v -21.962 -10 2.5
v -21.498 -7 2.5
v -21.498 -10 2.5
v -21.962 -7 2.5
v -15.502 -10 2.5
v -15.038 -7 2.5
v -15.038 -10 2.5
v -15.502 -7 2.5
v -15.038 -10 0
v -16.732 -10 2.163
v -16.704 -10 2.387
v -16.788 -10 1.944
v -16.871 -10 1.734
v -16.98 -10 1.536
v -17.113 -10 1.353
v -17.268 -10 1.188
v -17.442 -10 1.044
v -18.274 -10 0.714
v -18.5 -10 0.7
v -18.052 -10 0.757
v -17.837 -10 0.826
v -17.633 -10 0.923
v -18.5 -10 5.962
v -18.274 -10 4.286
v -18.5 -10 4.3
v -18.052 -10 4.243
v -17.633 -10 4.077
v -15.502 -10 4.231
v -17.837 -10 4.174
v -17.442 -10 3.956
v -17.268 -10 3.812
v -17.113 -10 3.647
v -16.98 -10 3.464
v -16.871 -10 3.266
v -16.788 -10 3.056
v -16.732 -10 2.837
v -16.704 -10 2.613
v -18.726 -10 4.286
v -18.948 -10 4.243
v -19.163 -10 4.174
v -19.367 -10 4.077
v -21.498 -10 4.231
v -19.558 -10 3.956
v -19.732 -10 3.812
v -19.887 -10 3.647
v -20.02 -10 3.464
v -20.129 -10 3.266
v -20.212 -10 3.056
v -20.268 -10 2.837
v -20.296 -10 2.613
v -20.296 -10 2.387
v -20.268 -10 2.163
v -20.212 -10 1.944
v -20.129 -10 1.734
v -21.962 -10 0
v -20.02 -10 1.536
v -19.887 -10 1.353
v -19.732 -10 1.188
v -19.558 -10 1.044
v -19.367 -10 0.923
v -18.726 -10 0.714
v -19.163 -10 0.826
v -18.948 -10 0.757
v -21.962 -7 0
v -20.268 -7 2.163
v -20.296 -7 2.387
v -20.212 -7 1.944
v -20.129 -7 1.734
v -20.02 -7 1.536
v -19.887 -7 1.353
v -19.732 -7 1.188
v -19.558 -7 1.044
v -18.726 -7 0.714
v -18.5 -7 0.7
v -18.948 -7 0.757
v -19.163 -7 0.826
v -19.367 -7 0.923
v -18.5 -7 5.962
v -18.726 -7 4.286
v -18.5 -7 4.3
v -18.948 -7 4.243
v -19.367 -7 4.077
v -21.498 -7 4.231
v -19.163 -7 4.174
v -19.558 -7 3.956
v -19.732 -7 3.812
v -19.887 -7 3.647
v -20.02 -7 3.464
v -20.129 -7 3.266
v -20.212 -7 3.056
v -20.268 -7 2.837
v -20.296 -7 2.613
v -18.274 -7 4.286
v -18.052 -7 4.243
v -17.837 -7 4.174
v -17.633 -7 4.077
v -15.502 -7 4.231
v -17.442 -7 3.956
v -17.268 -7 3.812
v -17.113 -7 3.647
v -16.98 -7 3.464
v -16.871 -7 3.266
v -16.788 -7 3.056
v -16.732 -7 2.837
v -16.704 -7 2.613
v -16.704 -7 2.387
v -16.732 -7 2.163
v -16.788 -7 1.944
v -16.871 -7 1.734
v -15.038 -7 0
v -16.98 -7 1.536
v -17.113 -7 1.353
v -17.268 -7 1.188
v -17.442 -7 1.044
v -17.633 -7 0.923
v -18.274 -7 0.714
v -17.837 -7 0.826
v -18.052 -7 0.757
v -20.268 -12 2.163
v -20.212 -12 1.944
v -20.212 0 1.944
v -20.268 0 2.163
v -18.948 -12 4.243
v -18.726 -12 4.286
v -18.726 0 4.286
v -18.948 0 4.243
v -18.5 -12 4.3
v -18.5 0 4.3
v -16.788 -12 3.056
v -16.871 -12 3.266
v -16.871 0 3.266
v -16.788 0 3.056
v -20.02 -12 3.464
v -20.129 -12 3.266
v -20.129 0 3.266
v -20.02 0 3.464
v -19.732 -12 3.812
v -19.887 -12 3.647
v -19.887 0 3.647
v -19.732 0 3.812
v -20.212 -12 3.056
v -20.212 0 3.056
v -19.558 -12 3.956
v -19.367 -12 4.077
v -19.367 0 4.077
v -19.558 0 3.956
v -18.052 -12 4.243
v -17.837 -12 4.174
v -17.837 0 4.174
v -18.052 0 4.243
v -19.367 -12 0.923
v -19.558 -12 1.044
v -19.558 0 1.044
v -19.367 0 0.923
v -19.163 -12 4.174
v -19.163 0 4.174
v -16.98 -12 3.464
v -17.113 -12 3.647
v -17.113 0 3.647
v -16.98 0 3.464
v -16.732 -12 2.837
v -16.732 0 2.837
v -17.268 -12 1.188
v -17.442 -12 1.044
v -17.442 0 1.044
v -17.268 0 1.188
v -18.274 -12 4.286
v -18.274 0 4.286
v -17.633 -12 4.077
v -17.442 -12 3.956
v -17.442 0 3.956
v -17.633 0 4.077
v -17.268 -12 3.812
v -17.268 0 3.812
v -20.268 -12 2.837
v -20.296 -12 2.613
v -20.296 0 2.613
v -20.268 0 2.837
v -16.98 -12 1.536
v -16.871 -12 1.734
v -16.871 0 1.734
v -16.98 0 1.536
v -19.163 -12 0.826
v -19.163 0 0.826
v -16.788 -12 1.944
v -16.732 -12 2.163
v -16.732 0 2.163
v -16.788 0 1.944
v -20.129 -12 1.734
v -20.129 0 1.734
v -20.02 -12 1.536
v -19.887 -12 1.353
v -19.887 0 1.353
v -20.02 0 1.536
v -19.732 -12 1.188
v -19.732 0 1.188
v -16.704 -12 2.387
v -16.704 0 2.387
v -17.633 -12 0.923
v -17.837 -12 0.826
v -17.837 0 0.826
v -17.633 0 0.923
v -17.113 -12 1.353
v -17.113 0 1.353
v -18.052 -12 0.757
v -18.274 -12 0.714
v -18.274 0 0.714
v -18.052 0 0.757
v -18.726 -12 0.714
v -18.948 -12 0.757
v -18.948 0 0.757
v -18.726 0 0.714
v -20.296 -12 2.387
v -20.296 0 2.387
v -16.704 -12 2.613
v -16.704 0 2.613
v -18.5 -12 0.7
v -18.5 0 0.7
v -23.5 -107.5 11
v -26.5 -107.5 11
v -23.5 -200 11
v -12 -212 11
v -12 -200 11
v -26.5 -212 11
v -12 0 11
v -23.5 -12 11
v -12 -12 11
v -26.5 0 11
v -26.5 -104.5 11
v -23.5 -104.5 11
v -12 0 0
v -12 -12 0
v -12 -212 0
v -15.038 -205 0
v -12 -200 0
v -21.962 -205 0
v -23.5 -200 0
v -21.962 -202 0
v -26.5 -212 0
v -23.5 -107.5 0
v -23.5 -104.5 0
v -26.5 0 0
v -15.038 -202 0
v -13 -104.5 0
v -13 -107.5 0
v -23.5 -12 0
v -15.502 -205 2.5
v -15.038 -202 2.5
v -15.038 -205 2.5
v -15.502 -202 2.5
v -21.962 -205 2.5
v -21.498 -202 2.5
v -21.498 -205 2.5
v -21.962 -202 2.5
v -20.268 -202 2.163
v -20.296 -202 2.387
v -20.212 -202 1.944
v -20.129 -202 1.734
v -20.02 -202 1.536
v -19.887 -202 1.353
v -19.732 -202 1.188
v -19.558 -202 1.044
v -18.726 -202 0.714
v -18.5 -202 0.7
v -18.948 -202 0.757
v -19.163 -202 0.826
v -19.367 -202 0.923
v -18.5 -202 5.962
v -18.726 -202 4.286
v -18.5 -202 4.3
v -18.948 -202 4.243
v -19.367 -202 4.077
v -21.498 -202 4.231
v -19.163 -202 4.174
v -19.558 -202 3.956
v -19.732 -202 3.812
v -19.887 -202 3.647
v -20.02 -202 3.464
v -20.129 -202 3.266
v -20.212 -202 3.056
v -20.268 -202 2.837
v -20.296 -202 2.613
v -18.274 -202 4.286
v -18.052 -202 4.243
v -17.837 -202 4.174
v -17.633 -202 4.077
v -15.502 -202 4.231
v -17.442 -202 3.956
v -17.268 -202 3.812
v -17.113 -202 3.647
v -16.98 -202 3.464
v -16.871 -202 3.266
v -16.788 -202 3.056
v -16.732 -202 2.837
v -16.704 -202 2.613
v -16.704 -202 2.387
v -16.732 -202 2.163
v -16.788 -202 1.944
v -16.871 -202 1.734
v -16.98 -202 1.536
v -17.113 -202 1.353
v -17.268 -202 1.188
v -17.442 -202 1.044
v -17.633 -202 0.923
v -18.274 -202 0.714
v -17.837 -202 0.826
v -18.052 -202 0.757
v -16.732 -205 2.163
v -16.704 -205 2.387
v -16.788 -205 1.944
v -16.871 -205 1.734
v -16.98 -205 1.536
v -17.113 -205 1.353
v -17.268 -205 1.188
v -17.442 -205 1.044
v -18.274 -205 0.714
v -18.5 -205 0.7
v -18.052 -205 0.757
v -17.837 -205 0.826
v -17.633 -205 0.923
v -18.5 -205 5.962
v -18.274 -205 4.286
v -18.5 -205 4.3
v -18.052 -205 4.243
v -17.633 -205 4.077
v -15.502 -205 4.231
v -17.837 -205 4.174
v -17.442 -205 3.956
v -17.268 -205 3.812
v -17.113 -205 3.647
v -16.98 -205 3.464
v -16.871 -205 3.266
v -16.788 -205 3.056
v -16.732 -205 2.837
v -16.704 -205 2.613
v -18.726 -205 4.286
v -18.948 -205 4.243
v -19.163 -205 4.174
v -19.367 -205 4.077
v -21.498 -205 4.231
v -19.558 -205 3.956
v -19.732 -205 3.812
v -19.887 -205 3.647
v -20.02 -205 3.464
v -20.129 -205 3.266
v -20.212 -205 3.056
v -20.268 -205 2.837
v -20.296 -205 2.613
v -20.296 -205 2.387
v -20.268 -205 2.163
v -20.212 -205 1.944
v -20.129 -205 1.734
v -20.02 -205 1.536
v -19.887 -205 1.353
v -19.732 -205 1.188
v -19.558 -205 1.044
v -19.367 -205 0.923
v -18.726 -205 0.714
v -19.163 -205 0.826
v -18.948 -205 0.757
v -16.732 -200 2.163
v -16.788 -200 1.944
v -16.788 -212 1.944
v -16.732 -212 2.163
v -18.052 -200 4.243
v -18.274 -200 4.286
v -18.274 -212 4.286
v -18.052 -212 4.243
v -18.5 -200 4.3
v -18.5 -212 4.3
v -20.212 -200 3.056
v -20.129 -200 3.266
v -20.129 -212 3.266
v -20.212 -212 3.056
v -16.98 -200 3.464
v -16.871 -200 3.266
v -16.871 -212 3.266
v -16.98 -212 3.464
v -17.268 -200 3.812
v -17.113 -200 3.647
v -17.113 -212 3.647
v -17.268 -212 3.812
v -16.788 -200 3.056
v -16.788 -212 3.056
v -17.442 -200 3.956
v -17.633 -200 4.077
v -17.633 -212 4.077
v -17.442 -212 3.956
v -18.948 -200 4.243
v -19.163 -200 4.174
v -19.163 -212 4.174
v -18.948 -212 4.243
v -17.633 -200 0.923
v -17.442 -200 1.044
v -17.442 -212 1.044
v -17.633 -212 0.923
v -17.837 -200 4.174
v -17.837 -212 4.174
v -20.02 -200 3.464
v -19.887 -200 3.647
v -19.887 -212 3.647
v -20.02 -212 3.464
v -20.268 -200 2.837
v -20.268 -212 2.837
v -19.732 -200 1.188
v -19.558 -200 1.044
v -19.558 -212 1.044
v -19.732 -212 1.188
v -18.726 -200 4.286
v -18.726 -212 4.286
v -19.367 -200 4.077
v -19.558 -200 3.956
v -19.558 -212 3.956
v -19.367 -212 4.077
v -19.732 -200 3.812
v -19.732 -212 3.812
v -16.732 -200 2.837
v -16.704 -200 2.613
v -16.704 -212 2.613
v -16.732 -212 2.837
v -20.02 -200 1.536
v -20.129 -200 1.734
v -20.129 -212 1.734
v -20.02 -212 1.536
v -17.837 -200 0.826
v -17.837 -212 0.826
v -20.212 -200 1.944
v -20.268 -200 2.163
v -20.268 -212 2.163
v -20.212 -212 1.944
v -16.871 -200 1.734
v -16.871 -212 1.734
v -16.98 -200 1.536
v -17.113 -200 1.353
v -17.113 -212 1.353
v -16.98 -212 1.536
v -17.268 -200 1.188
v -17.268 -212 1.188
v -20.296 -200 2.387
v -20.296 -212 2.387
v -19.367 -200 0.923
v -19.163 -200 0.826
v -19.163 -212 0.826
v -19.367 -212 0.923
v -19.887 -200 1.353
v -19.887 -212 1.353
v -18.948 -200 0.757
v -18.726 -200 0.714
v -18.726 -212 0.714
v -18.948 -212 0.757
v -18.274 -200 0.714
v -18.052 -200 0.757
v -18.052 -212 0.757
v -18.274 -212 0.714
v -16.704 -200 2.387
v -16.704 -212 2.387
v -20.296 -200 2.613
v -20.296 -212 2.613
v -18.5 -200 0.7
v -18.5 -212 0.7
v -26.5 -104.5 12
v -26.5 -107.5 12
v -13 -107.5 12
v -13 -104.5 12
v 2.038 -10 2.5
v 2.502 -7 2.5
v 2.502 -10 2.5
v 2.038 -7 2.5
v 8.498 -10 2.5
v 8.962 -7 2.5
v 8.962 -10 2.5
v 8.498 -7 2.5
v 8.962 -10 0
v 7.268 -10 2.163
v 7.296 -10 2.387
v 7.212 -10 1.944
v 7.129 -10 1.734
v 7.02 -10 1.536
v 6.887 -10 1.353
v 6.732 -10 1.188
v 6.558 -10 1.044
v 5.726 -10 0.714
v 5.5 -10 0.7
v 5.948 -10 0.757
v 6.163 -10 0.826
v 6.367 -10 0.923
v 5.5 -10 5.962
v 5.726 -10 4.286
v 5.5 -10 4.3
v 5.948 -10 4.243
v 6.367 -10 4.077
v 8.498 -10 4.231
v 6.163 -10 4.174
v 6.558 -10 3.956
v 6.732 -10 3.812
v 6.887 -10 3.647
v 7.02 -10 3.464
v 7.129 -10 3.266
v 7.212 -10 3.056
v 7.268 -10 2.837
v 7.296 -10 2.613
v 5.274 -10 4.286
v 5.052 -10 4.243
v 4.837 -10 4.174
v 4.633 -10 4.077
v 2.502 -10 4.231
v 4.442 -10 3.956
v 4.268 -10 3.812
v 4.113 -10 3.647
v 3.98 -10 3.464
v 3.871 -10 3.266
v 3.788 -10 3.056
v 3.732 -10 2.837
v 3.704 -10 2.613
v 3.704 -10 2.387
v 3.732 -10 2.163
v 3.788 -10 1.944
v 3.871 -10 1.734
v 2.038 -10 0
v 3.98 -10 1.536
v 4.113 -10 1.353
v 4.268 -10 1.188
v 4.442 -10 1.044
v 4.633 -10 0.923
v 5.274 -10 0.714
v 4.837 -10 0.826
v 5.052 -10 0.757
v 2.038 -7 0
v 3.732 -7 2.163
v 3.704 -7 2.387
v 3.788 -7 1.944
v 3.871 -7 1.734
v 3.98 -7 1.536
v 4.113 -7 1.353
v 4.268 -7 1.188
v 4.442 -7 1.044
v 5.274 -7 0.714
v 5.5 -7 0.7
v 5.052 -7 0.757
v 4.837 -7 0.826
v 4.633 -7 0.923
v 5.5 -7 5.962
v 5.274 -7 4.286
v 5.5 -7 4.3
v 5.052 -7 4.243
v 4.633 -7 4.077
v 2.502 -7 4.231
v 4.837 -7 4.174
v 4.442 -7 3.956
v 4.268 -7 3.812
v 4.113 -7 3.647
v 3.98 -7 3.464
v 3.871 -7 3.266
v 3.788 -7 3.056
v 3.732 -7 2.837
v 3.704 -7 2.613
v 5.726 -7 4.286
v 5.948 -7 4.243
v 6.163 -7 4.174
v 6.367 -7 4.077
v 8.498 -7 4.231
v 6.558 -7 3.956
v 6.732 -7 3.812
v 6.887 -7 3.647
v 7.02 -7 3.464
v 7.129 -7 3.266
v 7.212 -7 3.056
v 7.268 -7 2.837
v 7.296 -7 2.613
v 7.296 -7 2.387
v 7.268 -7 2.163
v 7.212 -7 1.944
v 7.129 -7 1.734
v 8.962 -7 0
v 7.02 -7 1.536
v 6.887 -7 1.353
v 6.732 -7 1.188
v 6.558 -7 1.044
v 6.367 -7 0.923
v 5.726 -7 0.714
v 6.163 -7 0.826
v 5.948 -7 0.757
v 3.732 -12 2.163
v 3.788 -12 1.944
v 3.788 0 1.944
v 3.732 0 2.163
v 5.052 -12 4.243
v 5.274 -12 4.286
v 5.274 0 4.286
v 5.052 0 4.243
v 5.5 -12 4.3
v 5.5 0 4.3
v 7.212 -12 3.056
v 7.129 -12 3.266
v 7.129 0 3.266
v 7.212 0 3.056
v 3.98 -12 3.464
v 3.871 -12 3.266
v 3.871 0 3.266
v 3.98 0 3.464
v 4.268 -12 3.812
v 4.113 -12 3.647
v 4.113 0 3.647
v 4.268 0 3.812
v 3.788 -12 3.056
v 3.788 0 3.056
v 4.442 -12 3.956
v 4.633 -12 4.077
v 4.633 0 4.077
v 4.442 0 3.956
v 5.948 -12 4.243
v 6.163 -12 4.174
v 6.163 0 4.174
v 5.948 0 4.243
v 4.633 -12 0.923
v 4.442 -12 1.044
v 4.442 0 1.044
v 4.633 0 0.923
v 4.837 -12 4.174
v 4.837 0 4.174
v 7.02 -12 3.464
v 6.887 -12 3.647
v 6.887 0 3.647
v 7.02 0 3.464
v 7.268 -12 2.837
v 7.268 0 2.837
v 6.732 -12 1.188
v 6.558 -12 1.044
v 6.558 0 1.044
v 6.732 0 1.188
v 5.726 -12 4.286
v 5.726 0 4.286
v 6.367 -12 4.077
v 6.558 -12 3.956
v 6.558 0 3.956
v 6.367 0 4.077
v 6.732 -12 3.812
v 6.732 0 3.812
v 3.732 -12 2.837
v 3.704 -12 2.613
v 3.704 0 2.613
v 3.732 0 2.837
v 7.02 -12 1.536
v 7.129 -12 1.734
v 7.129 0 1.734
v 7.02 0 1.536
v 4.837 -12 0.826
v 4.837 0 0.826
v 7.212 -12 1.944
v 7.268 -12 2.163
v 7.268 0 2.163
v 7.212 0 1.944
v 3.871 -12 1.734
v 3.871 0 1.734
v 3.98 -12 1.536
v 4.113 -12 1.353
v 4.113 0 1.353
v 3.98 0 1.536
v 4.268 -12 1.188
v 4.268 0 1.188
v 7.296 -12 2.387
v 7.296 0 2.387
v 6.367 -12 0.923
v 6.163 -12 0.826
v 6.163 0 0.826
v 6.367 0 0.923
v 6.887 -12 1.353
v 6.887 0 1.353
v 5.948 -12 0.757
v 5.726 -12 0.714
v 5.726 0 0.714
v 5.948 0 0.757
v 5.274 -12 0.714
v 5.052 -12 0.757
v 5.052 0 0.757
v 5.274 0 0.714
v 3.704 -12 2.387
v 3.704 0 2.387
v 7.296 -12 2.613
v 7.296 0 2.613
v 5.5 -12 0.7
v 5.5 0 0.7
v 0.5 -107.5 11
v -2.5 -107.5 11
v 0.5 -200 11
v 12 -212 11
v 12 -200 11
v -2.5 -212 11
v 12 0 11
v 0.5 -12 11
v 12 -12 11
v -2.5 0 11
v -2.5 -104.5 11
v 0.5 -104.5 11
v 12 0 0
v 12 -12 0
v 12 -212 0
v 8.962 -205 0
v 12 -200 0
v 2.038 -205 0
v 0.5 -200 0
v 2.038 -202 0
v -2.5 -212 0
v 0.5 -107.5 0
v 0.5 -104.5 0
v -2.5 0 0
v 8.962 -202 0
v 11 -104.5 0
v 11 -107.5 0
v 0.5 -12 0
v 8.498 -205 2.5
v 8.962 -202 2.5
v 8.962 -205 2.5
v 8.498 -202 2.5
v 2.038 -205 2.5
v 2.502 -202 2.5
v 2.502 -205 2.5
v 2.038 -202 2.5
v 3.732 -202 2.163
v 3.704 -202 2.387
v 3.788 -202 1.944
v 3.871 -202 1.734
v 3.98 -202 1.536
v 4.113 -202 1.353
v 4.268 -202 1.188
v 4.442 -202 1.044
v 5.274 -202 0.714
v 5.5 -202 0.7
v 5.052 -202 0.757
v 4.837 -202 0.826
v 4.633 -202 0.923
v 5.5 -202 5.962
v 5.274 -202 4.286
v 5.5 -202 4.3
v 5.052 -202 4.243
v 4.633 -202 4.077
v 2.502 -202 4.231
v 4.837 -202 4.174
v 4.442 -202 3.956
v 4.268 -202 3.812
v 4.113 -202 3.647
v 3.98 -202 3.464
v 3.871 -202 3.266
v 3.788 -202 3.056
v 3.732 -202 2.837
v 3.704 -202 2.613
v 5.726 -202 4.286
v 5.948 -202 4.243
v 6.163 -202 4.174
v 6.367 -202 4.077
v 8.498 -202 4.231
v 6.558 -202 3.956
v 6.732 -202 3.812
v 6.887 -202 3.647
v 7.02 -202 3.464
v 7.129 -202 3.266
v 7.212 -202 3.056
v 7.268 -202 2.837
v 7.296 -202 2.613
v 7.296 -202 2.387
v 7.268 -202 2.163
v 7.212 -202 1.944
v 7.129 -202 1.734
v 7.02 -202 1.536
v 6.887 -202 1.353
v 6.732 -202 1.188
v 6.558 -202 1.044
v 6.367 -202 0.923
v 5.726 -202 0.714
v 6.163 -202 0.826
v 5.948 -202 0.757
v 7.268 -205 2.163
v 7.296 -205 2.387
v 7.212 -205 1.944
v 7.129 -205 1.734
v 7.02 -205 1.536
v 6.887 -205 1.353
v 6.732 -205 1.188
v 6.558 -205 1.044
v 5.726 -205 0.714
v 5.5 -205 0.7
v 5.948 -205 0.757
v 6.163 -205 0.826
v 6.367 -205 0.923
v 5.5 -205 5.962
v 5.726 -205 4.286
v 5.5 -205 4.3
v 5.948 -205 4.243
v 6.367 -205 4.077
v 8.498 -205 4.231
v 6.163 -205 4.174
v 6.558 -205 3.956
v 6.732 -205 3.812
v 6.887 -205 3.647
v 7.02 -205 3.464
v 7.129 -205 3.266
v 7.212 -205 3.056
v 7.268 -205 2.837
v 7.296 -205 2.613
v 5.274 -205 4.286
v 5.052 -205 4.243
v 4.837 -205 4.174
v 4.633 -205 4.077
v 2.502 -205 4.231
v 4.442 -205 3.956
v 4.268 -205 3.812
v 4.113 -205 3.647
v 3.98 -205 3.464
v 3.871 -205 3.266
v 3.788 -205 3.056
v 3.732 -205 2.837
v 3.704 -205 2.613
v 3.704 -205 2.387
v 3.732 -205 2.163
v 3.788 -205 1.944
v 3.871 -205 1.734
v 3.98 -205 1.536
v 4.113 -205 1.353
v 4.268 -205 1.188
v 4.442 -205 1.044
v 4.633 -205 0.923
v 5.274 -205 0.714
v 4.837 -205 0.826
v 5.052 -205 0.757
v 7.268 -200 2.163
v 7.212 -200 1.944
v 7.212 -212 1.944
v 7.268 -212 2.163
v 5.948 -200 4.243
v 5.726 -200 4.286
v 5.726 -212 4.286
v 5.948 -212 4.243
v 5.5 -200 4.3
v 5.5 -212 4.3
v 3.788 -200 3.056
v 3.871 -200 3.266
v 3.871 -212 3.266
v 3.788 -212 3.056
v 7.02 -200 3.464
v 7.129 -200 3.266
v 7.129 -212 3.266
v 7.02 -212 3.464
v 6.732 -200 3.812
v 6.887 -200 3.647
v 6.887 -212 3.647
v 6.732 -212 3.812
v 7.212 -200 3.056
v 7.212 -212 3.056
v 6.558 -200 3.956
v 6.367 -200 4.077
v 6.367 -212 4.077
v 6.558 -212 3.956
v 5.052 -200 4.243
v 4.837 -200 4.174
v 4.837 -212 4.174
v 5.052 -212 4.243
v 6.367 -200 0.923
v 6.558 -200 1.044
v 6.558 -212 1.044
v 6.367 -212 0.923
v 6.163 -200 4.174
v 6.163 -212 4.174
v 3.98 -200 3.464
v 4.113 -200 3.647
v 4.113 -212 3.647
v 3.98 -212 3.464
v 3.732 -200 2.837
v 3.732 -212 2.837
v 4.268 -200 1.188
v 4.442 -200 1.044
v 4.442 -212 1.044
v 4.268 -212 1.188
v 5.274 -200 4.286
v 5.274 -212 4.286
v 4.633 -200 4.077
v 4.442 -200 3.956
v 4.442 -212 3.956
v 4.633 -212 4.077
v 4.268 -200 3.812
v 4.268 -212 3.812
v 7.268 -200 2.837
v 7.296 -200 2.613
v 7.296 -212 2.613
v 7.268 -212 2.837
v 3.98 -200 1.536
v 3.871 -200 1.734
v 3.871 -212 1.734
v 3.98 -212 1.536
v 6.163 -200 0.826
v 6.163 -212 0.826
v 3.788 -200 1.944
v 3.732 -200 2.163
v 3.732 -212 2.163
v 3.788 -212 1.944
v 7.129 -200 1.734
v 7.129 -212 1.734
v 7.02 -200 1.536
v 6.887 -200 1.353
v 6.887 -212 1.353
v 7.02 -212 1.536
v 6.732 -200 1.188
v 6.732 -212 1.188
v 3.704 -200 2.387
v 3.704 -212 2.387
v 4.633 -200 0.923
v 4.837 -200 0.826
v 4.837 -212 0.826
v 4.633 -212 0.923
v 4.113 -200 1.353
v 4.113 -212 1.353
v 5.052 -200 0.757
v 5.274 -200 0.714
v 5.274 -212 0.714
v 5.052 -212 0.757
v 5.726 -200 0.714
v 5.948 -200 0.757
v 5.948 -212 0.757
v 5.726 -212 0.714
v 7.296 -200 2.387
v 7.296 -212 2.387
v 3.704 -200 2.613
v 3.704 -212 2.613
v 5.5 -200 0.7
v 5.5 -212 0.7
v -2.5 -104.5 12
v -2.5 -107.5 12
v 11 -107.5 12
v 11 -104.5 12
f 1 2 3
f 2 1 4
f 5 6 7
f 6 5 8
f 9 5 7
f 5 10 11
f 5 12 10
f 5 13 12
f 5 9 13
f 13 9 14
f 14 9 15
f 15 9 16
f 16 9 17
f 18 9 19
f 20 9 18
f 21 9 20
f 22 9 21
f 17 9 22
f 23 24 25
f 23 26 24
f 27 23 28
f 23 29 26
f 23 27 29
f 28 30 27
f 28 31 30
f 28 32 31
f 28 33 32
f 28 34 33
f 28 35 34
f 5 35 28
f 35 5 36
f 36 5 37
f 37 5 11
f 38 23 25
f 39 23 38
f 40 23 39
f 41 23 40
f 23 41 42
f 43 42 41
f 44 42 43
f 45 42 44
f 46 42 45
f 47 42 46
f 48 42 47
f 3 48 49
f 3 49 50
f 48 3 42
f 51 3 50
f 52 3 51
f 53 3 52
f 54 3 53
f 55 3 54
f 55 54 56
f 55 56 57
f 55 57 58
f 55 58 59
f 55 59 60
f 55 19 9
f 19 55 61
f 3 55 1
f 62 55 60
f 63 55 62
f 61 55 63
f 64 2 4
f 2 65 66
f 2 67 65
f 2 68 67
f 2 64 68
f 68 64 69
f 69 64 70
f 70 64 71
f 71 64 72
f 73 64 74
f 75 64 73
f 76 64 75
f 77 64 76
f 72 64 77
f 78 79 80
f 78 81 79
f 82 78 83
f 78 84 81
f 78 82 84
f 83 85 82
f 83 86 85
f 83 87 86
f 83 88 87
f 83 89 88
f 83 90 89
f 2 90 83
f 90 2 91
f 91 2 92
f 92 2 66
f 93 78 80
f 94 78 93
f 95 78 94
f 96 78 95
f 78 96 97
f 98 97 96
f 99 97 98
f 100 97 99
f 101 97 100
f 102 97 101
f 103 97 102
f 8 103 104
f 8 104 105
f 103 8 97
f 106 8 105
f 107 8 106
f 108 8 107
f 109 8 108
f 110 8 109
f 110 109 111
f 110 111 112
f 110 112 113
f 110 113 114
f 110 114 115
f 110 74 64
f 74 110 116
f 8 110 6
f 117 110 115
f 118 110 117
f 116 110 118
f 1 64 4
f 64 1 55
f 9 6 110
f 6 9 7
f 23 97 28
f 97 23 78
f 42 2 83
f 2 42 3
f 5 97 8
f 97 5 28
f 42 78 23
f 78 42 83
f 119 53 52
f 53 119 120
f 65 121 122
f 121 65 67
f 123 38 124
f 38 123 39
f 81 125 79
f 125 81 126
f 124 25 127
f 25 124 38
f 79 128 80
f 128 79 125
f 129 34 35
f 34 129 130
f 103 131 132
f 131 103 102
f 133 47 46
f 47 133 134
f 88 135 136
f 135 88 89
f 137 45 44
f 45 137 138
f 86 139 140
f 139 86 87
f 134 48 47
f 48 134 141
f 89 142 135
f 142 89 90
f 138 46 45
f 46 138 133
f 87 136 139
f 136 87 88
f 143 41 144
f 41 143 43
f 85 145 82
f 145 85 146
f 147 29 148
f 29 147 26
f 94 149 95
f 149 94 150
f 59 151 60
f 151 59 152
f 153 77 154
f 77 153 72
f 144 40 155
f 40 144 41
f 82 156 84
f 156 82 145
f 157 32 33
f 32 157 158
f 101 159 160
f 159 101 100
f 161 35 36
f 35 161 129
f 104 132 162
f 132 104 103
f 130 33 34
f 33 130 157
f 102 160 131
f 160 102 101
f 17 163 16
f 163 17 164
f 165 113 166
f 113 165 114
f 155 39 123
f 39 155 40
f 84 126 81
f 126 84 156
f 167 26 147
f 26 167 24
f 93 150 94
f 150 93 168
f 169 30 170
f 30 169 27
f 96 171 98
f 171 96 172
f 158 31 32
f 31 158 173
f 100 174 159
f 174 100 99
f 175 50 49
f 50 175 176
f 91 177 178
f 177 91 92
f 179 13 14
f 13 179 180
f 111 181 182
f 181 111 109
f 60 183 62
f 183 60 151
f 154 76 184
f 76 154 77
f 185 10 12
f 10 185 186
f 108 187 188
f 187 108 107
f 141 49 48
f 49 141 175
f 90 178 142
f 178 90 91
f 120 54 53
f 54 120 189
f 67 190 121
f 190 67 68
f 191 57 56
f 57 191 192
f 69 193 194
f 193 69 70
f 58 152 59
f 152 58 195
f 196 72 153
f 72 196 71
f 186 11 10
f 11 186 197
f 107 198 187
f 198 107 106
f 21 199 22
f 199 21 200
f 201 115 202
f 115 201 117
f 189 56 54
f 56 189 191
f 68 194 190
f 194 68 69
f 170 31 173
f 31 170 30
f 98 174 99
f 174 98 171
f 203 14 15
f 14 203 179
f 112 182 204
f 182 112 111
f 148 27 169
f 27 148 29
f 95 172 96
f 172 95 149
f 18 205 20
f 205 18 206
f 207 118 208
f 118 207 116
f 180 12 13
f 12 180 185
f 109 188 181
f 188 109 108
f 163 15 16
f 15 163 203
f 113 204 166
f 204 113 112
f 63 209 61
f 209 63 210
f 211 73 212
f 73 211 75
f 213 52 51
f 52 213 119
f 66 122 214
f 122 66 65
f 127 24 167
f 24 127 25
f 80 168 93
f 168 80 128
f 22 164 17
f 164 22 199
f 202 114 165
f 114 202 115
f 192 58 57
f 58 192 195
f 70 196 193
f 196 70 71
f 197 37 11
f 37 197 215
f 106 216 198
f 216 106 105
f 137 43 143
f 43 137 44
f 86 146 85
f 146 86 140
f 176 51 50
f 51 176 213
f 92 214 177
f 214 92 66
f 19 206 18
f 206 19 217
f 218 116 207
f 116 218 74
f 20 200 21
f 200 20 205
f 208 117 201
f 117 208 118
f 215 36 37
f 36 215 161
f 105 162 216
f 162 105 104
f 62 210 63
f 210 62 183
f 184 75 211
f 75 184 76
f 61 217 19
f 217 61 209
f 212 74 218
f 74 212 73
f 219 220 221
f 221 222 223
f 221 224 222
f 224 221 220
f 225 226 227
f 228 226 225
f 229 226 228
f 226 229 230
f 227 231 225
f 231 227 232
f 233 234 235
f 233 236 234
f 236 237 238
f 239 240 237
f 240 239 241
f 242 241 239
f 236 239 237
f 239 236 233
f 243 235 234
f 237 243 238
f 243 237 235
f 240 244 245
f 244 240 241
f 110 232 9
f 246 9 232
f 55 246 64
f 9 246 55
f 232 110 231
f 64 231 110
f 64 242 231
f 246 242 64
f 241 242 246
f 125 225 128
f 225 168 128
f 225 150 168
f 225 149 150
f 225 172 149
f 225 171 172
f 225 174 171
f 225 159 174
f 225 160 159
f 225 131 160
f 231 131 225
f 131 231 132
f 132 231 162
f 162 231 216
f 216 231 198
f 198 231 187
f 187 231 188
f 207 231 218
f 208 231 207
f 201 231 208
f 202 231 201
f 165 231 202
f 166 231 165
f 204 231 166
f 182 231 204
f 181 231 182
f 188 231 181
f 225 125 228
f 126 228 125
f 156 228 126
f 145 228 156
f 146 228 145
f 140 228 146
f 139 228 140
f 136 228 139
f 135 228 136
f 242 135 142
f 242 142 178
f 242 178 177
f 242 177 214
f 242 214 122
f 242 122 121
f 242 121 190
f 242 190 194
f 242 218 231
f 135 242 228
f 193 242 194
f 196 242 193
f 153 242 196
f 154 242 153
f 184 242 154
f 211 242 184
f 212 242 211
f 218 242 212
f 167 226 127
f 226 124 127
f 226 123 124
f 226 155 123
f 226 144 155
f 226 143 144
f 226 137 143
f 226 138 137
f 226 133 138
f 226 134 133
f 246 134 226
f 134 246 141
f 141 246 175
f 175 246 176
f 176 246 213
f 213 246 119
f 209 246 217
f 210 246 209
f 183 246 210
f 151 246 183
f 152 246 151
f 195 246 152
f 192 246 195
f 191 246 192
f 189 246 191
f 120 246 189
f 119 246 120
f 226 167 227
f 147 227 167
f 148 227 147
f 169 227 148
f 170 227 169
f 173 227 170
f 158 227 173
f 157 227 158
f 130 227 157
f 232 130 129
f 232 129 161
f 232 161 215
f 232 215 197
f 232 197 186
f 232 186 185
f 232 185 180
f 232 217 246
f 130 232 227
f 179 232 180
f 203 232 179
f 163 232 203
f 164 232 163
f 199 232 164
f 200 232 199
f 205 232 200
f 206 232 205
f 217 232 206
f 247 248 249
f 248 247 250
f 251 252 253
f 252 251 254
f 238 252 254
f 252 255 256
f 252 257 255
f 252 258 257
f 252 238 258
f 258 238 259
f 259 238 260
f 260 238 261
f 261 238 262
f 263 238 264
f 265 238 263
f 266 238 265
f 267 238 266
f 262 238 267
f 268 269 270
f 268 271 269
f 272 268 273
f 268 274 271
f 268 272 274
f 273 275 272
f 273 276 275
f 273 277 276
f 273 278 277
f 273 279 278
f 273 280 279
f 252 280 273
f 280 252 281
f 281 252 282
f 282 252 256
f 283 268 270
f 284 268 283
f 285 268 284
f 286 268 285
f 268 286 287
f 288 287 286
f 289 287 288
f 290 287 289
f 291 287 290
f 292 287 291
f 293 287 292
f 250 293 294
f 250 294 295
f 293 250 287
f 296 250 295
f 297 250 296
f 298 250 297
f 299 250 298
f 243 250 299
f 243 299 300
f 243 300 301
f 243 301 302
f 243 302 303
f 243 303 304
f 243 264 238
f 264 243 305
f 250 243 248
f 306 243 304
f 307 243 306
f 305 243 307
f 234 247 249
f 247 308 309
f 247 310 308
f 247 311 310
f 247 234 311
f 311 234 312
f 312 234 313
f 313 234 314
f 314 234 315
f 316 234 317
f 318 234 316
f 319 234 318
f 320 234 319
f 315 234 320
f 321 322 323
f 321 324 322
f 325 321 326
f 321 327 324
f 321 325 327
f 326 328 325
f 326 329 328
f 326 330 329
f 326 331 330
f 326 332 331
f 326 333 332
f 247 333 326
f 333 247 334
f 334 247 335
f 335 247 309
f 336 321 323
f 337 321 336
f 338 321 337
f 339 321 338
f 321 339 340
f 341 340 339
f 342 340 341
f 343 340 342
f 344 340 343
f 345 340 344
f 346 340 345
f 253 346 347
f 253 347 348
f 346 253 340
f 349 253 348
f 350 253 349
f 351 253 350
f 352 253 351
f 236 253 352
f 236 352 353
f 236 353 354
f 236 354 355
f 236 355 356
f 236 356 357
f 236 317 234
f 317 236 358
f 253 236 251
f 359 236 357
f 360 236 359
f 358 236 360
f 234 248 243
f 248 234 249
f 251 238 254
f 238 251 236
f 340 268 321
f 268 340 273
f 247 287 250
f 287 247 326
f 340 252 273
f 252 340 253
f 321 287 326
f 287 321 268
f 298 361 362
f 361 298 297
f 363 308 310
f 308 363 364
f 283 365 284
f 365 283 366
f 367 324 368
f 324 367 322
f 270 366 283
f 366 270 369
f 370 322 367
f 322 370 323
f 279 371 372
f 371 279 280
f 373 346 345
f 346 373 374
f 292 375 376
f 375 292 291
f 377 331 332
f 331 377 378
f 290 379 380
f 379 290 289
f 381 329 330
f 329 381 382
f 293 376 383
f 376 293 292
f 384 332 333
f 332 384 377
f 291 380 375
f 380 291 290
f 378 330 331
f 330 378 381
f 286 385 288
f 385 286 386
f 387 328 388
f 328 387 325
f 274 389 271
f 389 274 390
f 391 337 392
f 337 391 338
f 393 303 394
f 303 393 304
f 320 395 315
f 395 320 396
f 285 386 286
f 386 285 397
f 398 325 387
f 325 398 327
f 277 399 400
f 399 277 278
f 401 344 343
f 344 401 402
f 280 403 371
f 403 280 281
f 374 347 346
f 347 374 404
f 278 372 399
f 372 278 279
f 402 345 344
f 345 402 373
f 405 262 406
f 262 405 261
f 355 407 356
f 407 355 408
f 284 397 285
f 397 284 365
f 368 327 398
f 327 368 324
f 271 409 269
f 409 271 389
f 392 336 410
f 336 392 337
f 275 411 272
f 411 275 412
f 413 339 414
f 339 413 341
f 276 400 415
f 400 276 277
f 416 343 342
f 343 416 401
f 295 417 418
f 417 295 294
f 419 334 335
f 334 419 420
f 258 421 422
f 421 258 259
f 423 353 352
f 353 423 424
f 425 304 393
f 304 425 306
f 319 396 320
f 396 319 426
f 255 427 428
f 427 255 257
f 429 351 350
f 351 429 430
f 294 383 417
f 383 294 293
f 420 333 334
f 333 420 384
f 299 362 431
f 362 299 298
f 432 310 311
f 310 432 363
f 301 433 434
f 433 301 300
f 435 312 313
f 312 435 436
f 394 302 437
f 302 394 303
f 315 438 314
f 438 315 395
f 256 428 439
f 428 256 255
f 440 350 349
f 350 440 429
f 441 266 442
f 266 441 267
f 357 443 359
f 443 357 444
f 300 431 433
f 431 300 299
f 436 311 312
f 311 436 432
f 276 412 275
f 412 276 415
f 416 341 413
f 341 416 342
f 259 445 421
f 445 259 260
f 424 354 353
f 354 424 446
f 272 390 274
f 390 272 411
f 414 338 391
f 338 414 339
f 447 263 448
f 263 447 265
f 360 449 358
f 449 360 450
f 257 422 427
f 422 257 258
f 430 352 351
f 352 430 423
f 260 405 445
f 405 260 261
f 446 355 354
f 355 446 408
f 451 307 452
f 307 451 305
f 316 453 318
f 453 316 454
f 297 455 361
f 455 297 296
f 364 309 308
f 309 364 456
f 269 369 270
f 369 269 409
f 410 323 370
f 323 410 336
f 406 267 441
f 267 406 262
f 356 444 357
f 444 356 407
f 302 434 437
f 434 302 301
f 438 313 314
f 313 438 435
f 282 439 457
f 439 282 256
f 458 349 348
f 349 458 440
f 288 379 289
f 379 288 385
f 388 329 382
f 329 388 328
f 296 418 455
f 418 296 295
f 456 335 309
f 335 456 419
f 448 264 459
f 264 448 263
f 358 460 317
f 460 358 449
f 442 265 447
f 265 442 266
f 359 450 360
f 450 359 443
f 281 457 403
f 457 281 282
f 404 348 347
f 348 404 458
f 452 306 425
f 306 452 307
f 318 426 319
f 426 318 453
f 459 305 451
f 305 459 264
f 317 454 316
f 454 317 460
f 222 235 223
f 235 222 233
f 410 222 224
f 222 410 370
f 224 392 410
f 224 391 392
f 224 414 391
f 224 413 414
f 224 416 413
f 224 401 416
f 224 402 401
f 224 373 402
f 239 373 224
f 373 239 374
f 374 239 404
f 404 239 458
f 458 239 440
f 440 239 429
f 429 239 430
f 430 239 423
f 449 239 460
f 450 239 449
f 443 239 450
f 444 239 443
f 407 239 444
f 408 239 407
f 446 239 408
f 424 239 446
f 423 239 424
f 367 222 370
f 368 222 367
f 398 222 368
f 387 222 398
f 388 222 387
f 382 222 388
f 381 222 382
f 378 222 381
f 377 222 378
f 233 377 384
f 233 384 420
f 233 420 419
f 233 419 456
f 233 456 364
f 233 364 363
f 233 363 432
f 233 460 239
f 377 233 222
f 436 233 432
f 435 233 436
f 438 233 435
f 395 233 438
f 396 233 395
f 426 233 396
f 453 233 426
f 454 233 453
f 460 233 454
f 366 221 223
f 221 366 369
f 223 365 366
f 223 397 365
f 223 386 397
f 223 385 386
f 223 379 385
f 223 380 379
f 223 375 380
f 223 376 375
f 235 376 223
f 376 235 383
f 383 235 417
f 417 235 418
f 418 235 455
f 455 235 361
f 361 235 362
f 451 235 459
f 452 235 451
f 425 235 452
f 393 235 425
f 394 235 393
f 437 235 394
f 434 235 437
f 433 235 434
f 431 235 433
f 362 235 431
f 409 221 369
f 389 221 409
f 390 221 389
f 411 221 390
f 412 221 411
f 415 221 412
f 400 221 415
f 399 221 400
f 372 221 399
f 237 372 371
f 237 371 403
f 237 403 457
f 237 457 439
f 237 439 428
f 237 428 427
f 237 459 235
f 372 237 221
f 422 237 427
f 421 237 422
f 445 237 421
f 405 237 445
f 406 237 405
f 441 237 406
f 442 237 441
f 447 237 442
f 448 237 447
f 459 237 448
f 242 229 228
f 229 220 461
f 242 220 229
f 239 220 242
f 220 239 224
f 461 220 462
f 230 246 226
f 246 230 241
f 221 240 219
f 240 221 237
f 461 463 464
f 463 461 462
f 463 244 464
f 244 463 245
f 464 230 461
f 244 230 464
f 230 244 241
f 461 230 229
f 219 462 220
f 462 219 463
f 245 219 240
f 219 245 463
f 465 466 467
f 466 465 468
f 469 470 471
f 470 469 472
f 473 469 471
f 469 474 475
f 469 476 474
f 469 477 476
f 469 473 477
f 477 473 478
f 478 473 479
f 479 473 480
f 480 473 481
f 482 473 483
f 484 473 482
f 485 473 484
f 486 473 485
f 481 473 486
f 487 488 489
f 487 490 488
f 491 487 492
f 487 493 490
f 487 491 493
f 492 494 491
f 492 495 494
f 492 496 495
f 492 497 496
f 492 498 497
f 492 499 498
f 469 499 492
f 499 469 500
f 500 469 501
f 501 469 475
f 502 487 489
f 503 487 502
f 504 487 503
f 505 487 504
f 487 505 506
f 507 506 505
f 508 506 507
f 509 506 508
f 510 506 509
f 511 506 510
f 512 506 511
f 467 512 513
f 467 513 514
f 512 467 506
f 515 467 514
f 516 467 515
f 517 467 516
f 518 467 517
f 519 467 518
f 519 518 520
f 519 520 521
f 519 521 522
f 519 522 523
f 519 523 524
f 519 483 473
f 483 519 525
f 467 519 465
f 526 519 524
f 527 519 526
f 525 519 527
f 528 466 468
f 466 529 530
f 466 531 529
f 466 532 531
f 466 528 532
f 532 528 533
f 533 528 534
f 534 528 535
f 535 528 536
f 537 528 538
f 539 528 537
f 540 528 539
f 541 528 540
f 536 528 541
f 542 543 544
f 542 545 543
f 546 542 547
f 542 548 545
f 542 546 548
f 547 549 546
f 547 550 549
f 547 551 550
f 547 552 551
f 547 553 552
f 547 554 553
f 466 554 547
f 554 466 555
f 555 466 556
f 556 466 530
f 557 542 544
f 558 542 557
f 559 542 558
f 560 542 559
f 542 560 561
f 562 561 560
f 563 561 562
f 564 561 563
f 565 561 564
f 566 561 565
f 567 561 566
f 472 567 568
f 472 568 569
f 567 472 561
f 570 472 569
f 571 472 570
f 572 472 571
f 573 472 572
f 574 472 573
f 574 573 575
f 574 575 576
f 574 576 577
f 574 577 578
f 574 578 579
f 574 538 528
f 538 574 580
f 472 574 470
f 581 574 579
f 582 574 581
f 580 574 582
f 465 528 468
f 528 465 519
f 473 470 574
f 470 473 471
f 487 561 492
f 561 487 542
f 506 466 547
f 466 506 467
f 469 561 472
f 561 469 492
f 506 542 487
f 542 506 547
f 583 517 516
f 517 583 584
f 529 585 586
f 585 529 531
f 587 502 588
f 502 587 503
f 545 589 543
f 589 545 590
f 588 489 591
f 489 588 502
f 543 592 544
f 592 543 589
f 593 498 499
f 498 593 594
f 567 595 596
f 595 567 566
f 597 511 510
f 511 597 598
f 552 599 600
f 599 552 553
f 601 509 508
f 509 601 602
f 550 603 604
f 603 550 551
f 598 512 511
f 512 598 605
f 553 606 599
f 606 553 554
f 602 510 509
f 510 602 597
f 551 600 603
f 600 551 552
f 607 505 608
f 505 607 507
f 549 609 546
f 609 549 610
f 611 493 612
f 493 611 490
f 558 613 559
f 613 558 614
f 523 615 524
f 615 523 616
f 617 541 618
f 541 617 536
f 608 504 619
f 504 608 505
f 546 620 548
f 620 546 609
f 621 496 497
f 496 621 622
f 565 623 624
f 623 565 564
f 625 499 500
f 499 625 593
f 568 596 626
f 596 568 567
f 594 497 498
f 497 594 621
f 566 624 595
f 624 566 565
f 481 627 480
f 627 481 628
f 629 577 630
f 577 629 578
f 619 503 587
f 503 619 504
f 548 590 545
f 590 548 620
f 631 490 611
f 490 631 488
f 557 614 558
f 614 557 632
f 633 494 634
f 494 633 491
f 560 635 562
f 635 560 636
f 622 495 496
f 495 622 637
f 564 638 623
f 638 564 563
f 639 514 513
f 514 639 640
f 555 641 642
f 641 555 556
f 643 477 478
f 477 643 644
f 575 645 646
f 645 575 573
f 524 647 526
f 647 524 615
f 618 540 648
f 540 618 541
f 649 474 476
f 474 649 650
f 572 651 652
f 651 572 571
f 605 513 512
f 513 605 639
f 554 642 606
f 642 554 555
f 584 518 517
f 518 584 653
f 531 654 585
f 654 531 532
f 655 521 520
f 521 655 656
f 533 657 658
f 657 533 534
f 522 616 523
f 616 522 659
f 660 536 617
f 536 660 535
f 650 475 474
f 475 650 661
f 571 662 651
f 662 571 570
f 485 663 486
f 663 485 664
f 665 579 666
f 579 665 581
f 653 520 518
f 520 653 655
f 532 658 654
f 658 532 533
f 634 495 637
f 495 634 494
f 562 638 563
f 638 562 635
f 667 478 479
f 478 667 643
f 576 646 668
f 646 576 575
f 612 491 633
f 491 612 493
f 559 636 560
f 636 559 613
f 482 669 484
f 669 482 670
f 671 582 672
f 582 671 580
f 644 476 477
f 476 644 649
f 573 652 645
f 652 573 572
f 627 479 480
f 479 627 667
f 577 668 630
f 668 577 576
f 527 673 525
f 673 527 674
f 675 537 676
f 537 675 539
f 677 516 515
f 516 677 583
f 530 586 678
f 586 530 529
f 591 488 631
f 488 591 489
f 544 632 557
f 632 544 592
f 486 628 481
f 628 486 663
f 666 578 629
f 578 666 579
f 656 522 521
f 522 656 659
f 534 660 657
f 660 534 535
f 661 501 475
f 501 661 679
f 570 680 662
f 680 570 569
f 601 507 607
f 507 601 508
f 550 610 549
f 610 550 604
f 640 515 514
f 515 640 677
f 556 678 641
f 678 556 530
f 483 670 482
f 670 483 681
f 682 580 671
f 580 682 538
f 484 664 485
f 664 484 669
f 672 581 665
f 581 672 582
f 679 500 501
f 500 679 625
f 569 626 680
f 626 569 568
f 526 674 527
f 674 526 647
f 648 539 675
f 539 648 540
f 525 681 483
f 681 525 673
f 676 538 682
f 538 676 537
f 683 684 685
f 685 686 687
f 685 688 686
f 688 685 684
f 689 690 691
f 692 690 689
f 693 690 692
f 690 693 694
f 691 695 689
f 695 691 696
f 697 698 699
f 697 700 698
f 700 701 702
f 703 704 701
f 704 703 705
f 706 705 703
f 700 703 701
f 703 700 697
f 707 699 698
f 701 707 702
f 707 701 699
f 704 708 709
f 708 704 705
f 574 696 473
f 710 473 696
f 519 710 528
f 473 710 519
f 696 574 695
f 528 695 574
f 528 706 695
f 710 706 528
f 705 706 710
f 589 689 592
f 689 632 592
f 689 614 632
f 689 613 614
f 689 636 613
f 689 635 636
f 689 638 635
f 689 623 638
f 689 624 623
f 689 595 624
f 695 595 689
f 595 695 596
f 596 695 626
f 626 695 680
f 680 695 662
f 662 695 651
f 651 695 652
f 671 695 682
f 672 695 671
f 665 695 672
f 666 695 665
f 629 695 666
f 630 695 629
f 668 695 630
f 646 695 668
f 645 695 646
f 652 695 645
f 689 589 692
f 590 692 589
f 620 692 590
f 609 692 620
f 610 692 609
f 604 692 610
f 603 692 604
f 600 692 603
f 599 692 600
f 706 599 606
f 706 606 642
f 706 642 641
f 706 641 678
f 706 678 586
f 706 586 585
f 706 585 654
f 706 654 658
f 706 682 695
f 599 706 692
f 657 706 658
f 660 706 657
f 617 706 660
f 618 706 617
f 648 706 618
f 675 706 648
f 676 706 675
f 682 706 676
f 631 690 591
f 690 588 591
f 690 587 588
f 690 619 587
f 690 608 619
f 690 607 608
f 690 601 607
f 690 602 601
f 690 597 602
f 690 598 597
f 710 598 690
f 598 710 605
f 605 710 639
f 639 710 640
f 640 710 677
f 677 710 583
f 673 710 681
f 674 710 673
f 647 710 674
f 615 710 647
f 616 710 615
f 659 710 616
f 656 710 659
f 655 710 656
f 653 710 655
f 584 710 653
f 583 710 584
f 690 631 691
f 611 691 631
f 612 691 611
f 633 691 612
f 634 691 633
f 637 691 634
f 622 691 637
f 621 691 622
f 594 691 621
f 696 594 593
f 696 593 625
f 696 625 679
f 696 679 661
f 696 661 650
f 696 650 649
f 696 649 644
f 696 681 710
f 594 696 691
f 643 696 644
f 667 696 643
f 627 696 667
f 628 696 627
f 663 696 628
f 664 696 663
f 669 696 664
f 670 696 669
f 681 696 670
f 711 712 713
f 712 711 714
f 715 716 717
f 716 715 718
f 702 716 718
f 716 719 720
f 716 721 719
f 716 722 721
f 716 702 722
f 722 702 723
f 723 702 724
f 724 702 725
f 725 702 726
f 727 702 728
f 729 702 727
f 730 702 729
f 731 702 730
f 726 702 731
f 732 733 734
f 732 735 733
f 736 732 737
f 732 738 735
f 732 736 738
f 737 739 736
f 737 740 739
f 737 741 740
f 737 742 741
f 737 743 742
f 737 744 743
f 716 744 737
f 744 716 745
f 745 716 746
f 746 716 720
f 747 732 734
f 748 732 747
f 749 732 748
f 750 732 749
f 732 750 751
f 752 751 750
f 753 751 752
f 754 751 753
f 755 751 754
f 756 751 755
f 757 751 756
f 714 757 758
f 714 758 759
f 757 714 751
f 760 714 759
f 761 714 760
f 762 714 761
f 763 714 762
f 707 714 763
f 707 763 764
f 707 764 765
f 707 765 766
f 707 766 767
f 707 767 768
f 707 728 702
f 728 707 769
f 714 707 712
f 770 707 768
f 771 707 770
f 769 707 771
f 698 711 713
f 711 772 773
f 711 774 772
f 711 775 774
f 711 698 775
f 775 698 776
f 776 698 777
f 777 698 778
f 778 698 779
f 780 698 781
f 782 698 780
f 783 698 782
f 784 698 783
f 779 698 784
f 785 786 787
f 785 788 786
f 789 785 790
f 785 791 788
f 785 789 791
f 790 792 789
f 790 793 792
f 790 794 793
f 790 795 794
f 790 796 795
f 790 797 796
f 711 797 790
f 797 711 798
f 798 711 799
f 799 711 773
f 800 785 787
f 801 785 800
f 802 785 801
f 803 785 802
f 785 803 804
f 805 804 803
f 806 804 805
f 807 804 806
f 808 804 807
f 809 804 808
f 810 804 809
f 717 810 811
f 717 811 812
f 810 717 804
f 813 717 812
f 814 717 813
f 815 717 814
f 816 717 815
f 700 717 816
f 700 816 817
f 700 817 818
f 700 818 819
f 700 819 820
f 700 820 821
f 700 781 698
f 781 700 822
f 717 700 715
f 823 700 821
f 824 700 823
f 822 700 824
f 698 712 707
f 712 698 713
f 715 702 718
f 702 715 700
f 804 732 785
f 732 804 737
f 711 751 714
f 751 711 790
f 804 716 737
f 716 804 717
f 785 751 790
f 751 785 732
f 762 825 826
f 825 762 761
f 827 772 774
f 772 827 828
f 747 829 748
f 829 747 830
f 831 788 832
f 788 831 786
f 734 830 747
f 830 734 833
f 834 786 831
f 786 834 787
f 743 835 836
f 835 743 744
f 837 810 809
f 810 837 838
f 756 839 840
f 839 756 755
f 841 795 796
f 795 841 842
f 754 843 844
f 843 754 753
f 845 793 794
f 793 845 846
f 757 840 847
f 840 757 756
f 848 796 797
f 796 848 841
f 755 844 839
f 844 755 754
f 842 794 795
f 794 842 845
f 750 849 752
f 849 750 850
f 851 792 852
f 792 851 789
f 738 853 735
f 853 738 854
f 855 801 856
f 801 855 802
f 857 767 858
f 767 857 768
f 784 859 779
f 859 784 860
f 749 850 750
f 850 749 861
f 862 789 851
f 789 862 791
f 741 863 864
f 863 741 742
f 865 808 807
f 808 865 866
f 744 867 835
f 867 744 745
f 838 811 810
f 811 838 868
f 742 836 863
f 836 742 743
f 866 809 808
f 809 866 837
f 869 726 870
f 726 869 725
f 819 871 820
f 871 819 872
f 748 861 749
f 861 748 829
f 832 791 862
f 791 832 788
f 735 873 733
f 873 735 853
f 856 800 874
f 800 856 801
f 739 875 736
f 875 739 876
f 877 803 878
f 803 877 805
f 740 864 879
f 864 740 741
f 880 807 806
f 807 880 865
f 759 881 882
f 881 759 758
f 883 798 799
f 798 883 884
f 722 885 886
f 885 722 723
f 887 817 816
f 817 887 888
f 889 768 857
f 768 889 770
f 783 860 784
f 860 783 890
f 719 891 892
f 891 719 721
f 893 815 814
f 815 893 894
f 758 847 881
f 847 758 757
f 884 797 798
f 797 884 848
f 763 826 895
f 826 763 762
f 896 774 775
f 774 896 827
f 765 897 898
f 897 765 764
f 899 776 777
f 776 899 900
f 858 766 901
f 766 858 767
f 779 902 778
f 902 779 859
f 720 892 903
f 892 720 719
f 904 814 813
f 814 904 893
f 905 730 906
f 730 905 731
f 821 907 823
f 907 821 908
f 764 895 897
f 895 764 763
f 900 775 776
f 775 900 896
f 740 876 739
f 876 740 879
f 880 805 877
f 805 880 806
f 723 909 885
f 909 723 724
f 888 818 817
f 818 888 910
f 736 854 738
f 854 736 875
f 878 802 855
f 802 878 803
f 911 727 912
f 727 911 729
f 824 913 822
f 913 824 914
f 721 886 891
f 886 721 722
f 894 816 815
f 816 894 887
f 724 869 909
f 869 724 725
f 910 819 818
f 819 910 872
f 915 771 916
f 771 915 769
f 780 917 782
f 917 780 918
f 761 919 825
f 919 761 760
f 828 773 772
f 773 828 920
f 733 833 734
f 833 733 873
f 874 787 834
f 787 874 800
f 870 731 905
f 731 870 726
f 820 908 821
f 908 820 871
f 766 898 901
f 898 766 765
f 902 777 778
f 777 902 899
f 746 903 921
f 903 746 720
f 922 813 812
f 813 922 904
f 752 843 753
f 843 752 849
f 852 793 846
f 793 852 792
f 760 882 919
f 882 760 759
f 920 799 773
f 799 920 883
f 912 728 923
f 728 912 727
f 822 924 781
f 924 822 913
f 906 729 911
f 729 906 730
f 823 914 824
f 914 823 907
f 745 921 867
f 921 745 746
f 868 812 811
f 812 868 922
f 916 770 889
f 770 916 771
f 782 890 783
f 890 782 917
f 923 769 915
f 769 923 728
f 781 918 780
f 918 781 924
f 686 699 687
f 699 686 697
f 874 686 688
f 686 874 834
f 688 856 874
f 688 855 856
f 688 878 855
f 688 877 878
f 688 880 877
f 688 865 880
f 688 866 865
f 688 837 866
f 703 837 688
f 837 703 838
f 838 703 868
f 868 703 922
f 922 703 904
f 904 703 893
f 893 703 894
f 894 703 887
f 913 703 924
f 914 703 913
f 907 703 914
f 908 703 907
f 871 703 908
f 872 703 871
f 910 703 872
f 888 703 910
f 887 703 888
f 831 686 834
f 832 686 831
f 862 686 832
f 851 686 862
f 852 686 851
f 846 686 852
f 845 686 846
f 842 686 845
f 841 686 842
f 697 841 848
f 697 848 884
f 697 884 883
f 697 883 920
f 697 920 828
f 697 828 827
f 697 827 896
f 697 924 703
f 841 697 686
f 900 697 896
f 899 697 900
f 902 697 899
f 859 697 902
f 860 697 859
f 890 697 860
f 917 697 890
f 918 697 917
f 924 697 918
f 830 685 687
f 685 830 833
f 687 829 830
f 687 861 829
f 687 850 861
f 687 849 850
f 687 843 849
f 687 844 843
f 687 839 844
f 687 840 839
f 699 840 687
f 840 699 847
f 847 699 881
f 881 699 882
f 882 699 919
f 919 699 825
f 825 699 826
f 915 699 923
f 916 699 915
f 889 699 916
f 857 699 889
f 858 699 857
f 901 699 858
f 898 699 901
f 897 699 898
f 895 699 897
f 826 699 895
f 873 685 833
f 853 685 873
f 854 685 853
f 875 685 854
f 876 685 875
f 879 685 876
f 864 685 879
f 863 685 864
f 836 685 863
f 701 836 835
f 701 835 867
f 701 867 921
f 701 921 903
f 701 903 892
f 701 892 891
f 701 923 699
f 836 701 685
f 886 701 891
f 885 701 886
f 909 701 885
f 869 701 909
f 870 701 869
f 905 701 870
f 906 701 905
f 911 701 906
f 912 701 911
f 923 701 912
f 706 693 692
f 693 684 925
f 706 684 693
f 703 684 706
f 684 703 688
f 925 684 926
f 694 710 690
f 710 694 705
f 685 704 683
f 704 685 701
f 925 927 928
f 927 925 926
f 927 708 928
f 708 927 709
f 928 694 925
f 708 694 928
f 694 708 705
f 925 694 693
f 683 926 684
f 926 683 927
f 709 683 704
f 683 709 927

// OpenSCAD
$fn = 50;

difference() {
	union() {
		translate(v = [-12.0, 0, 0]) {
			rotate(a = [0, 0, 0]) {
				difference() {
					union() {
						translate(v = [0, 0, 2.5]) {
							rotate(a = [0, -90, 0]) {
								difference() {
									union() {
										translate(v = [0, 0, 0]) {
											rotate(a = [0, 0, 0]) {
												difference() {
													union() {
														translate(v = [-2.5, -12.0, 0.0]) {
															cube(size = [11.0, 12.0, 13.0]);
														}
													}
													union() {
														translate(v = [0, -7.0, 6.5]) {
															rotate(a = [90, 0, 0]) {
																difference() {
																	union() {
																		translate(v = [-20.0, -3.4619999999999997, 0]) {
																			cube(size = [20, 6.9239999999999995, 3]);
																		}
																		linear_extrude(height = 3) {
																			polygon(points = [[3.4619999999999997, 0.0], [1.7310000000000003, 2.9981799479017264], [-1.7309999999999992, 2.9981799479017264], [-3.4619999999999997, 4.2397272186481365e-16], [-1.7310000000000014, -2.998179947901726], [1.7309999999999977, -2.9981799479017277]]);
																		}
																	}
																	union();
																}
															}
														}
														translate(v = [0, 0.1, 6.5]) {
															rotate(a = [90, 0, 0]) {
																cylinder(h = 20.0, r = 1.8);
															}
														}
													}
												}
											}
										}
										translate(v = [0, -212.0, 13.0]) {
											rotate(a = [180, 0, 0]) {
												difference() {
													union() {
														translate(v = [-2.5, -12.0, 0.0]) {
															cube(size = [11.0, 12.0, 13.0]);
														}
													}
													union() {
														translate(v = [0, -7.0, 6.5]) {
															rotate(a = [90, 0, 0]) {
																difference() {
																	union() {
																		translate(v = [-20.0, -3.4619999999999997, 0]) {
																			cube(size = [20, 6.9239999999999995, 3]);
																		}
																		linear_extrude(height = 3) {
																			polygon(points = [[3.4619999999999997, 0.0], [1.7310000000000003, 2.9981799479017264], [-1.7309999999999992, 2.9981799479017264], [-3.4619999999999997, 4.2397272186481365e-16], [-1.7310000000000014, -2.998179947901726], [1.7309999999999977, -2.9981799479017277]]);
																		}
																	}
																	union();
																}
															}
														}
														translate(v = [0, 0.1, 6.5]) {
															rotate(a = [90, 0, 0]) {
																cylinder(h = 20.0, r = 1.8);
															}
														}
													}
												}
											}
										}
										translate(v = [-2.5, -212.0, 11.5]) {
											cube(size = [11.0, 212.0, 3.0]);
										}
										translate(v = [-2.5, -107.5, 1.0]) {
											cube(size = [12.0, 3.0, 13.5]);
										}
									}
									union();
								}
							}
						}
					}
					union();
				}
			}
		}
		translate(v = [12.0, 0, 0]) {
			rotate(a = [0, 0, 0]) {
				difference() {
					union() {
						translate(v = [0, 0, 2.5]) {
							rotate(a = [0, -90, 0]) {
								difference() {
									union() {
										translate(v = [0, 0, 0]) {
											rotate(a = [0, 0, 0]) {
												difference() {
													union() {
														translate(v = [-2.5, -12.0, 0.0]) {
															cube(size = [11.0, 12.0, 13.0]);
														}
													}
													union() {
														translate(v = [0, -7.0, 6.5]) {
															rotate(a = [90, 0, 0]) {
																difference() {
																	union() {
																		translate(v = [-20.0, -3.4619999999999997, 0]) {
																			cube(size = [20, 6.9239999999999995, 3]);
																		}
																		linear_extrude(height = 3) {
																			polygon(points = [[3.4619999999999997, 0.0], [1.7310000000000003, 2.9981799479017264], [-1.7309999999999992, 2.9981799479017264], [-3.4619999999999997, 4.2397272186481365e-16], [-1.7310000000000014, -2.998179947901726], [1.7309999999999977, -2.9981799479017277]]);
																		}
																	}
																	union();
																}
															}
														}
														translate(v = [0, 0.1, 6.5]) {
															rotate(a = [90, 0, 0]) {
																cylinder(h = 20.0, r = 1.8);
															}
														}
													}
												}
											}
										}
										translate(v = [0, -212.0, 13.0]) {
											rotate(a = [180, 0, 0]) {
												difference() {
													union() {
														translate(v = [-2.5, -12.0, 0.0]) {
															cube(size = [11.0, 12.0, 13.0]);
														}
													}
													union() {
														translate(v = [0, -7.0, 6.5]) {
															rotate(a = [90, 0, 0]) {
																difference() {
																	union() {
																		translate(v = [-20.0, -3.4619999999999997, 0]) {
																			cube(size = [20, 6.9239999999999995, 3]);
																		}
																		linear_extrude(height = 3) {
																			polygon(points = [[3.4619999999999997, 0.0], [1.7310000000000003, 2.9981799479017264], [-1.7309999999999992, 2.9981799479017264], [-3.4619999999999997, 4.2397272186481365e-16], [-1.7310000000000014, -2.998179947901726], [1.7309999999999977, -2.9981799479017277]]);
																		}
																	}
																	union();
																}
															}
														}
														translate(v = [0, 0.1, 6.5]) {
															rotate(a = [90, 0, 0]) {
																cylinder(h = 20.0, r = 1.8);
															}
														}
													}
												}
											}
										}
										translate(v = [-2.5, -212.0, 11.5]) {
											cube(size = [11.0, 212.0, 3.0]);
										}
										translate(v = [-2.5, -107.5, 1.0]) {
											cube(size = [12.0, 3.0, 13.5]);
										}
									}
									union();
								}
							}
						}
					}
					union();
				}
			}
		}
	}
	union();
}
